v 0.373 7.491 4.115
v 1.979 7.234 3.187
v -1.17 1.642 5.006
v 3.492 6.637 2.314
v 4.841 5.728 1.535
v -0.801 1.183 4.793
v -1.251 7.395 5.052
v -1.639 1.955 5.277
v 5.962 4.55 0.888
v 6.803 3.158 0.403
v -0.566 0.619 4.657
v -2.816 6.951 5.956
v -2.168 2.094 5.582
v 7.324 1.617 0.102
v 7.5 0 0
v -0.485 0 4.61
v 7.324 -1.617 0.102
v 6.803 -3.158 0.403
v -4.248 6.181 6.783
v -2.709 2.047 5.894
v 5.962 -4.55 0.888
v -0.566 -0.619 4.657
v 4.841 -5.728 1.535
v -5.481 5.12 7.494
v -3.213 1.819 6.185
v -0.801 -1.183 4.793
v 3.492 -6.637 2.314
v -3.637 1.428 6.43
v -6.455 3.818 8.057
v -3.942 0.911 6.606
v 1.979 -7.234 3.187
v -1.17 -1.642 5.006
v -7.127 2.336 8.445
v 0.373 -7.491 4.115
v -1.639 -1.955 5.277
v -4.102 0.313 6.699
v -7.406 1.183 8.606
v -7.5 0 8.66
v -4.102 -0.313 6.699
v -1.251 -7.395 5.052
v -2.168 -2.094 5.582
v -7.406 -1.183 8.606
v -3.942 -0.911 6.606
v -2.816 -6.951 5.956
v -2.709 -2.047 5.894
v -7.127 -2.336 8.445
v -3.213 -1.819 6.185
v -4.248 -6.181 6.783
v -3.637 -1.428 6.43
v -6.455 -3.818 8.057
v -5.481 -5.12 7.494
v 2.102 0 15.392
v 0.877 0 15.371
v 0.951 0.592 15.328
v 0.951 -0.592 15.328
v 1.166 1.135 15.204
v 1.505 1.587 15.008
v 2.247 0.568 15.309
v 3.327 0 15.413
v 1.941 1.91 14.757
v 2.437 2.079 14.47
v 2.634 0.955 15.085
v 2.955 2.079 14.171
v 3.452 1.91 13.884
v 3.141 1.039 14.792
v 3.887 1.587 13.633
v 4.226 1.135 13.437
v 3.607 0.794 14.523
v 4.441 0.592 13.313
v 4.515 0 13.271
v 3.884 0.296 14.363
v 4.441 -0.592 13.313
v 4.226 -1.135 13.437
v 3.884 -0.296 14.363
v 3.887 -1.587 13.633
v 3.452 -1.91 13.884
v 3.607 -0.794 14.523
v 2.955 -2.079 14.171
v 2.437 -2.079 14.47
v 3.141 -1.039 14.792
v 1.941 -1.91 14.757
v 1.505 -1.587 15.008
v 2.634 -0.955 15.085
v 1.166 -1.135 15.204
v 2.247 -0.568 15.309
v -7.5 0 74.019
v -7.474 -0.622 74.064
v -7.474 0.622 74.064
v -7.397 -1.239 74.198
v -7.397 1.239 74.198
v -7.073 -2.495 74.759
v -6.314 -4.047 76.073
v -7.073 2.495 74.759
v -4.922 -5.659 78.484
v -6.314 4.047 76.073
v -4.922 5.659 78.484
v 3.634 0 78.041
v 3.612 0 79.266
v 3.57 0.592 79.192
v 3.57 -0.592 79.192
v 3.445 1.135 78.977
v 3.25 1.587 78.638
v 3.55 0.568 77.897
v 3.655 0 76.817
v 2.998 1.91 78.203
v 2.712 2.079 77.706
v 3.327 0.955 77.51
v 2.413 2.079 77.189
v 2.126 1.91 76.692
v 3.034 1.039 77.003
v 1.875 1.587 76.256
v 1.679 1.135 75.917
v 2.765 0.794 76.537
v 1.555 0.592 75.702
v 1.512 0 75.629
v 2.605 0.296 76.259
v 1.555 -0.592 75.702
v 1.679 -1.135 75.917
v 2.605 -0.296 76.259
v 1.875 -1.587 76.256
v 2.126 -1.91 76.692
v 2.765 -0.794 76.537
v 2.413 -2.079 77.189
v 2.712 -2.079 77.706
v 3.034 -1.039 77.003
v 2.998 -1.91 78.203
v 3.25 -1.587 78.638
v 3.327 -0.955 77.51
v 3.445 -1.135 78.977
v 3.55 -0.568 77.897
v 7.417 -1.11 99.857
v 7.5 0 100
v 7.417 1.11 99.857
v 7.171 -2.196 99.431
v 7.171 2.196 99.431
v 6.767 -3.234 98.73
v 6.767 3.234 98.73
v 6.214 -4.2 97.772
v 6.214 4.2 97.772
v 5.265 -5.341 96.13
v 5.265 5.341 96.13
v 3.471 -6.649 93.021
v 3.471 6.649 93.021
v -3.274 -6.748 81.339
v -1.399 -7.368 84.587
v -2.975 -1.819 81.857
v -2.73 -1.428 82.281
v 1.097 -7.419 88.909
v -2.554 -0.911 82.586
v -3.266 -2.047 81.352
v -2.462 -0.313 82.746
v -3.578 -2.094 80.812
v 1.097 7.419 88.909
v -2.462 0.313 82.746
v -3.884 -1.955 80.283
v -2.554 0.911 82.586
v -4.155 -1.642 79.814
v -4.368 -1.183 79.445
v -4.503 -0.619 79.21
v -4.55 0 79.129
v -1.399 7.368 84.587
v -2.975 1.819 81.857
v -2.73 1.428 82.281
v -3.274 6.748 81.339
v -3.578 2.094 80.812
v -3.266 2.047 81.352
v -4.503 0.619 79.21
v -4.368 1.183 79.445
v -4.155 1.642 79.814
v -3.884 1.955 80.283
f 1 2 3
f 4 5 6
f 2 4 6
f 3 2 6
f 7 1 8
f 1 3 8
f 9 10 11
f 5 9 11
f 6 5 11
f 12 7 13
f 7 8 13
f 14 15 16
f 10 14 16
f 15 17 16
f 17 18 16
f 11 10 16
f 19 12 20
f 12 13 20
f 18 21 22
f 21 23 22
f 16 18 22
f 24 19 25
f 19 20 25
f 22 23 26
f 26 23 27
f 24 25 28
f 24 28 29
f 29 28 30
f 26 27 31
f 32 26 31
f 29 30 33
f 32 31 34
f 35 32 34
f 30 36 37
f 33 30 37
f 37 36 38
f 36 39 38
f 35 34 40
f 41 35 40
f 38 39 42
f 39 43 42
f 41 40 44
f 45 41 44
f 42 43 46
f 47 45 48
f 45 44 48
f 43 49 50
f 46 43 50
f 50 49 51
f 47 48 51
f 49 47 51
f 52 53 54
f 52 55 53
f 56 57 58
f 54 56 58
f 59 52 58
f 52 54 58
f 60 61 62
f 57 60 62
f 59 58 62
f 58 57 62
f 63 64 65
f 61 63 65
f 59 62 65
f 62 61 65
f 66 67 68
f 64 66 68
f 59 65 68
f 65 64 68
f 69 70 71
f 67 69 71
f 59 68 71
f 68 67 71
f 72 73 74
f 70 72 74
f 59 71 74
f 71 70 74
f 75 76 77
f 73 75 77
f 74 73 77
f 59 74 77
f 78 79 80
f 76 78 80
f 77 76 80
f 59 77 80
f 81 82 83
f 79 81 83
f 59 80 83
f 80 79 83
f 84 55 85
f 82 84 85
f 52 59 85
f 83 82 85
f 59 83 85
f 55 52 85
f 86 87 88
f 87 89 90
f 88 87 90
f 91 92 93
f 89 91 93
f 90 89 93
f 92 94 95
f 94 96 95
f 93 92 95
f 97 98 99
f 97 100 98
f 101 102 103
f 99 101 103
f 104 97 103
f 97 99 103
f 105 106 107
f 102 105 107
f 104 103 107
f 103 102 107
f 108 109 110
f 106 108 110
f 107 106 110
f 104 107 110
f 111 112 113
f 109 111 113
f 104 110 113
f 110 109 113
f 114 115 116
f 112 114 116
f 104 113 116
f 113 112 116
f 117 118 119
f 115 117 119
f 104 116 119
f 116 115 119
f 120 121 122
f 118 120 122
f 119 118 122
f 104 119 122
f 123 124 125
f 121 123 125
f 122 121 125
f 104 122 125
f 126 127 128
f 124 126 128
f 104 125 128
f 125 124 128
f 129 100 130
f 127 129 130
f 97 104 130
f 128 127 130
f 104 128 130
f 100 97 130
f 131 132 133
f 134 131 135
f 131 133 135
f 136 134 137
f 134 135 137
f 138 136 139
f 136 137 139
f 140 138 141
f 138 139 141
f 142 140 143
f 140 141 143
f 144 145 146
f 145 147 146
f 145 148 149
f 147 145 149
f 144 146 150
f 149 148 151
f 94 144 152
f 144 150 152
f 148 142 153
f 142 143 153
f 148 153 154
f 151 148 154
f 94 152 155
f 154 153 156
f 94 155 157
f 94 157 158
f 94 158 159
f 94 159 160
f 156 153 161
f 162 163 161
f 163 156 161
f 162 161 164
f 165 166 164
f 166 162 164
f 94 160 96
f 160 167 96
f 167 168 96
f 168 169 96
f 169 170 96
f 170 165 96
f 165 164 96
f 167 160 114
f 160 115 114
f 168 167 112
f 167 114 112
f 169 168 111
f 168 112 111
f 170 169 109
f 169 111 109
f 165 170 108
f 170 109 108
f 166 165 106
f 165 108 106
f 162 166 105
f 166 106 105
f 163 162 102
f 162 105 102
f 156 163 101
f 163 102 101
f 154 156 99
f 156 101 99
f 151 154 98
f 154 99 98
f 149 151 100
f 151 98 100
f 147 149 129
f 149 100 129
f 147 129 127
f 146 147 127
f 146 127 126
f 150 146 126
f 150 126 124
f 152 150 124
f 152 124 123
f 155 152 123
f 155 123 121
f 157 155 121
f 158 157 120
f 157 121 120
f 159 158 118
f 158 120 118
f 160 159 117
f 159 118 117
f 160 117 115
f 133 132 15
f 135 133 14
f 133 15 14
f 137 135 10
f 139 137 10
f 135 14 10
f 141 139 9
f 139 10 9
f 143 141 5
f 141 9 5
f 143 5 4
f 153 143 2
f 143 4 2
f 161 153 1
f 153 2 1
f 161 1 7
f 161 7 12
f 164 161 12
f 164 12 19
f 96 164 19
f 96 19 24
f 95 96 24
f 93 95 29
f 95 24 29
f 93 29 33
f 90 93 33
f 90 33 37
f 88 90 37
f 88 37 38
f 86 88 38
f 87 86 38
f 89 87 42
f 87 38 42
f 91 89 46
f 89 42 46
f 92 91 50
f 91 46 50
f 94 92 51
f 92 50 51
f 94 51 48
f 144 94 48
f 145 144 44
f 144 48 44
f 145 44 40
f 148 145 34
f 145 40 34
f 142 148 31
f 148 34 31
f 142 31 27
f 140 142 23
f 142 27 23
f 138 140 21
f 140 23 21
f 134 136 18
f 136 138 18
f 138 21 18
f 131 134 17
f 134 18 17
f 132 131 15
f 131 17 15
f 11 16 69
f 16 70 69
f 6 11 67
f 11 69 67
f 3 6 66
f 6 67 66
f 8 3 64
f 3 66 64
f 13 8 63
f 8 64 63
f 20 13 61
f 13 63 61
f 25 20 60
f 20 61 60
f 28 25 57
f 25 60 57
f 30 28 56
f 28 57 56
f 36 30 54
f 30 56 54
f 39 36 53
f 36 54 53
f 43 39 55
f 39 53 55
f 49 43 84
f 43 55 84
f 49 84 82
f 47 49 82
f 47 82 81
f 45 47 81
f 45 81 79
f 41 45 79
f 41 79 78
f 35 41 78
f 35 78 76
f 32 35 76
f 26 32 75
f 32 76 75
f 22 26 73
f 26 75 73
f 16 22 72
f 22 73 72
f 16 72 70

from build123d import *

# Parameters (mm, degrees)
SKETCH1_R                 = 7.5
BOSS_EXTRUDE1_DEPTH       = 100
CUT_EXTRUDE1_DEPTH        = 8.5
CUT_EXTRUDE1_DEPTH_BACK   = 8.5
M5X0_8_TAPPED_HOLE2_D     = 4.2
M5X0_8_TAPPED_HOLE2_DEPTH = 10
M5X0_8_TAPPED_HOLE2_TIP   = 1.2618073
M5X0_8_TAPPED_HOLE3_D     = 4.2
M5X0_8_TAPPED_HOLE3_DEPTH = 7
M5X0_8_TAPPED_HOLE3_TIP   = 1.2618073


with BuildPart() as part:
    # Sketch1 → Boss-Extrude1 (new body)
    with BuildSketch(Plane.XY):
        Circle(SKETCH1_R)
    extrude(amount=BOSS_EXTRUDE1_DEPTH)

    # Sketch5 → Cut-Extrude1 (cut, two sides)
    with BuildSketch(Plane(origin=(0, 0, 0), x_dir=(1, 0, 0), z_dir=(0, 1, 0))) as cut_extrude1_sk:
        Polygon((7.5, 0), (-7.5, -8.660254038), (-7.5, 0), align=None)
        Polygon((7.5, -100), (-4.922116598, -78.484262915), (-7.5, -74.019237886), (-7.5, -100), align=None)
    extrude(amount=CUT_EXTRUDE1_DEPTH, mode=Mode.SUBTRACT)
    extrude(cut_extrude1_sk.sketch, amount=-CUT_EXTRUDE1_DEPTH_BACK, mode=Mode.SUBTRACT)

    # M5x0.8 Tapped Hole2
    with Locations(Plane(origin=(1.875, 0, 3.247595264), x_dir=(-0.866025404, 0, 0.5), z_dir=(-0.5, 0, -0.866025404))):
        with Locations((4.825317547, 0)):
            Hole(M5X0_8_TAPPED_HOLE2_D / 2, depth=M5X0_8_TAPPED_HOLE2_DEPTH)
            with Locations((0, 0, -(M5X0_8_TAPPED_HOLE2_DEPTH + M5X0_8_TAPPED_HOLE2_TIP / 2))):  # 118° drill point
                Cone(0, M5X0_8_TAPPED_HOLE2_D / 2, M5X0_8_TAPPED_HOLE2_TIP, mode=Mode.SUBTRACT)

    # M5x0.8 Tapped Hole3
    with Locations(Plane(origin=(-37.676270189, 0, 21.752404736), x_dir=(0.5, 0, 0.866025404), z_dir=(-0.866025404, 0, 0.5))):
        with Locations((68.352540378, 0)):
            Hole(M5X0_8_TAPPED_HOLE3_D / 2, depth=M5X0_8_TAPPED_HOLE3_DEPTH)
            with Locations((0, 0, -(M5X0_8_TAPPED_HOLE3_DEPTH + M5X0_8_TAPPED_HOLE3_TIP / 2))):  # 118° drill point
                Cone(0, M5X0_8_TAPPED_HOLE3_D / 2, M5X0_8_TAPPED_HOLE3_TIP, mode=Mode.SUBTRACT)


solid = part.part
